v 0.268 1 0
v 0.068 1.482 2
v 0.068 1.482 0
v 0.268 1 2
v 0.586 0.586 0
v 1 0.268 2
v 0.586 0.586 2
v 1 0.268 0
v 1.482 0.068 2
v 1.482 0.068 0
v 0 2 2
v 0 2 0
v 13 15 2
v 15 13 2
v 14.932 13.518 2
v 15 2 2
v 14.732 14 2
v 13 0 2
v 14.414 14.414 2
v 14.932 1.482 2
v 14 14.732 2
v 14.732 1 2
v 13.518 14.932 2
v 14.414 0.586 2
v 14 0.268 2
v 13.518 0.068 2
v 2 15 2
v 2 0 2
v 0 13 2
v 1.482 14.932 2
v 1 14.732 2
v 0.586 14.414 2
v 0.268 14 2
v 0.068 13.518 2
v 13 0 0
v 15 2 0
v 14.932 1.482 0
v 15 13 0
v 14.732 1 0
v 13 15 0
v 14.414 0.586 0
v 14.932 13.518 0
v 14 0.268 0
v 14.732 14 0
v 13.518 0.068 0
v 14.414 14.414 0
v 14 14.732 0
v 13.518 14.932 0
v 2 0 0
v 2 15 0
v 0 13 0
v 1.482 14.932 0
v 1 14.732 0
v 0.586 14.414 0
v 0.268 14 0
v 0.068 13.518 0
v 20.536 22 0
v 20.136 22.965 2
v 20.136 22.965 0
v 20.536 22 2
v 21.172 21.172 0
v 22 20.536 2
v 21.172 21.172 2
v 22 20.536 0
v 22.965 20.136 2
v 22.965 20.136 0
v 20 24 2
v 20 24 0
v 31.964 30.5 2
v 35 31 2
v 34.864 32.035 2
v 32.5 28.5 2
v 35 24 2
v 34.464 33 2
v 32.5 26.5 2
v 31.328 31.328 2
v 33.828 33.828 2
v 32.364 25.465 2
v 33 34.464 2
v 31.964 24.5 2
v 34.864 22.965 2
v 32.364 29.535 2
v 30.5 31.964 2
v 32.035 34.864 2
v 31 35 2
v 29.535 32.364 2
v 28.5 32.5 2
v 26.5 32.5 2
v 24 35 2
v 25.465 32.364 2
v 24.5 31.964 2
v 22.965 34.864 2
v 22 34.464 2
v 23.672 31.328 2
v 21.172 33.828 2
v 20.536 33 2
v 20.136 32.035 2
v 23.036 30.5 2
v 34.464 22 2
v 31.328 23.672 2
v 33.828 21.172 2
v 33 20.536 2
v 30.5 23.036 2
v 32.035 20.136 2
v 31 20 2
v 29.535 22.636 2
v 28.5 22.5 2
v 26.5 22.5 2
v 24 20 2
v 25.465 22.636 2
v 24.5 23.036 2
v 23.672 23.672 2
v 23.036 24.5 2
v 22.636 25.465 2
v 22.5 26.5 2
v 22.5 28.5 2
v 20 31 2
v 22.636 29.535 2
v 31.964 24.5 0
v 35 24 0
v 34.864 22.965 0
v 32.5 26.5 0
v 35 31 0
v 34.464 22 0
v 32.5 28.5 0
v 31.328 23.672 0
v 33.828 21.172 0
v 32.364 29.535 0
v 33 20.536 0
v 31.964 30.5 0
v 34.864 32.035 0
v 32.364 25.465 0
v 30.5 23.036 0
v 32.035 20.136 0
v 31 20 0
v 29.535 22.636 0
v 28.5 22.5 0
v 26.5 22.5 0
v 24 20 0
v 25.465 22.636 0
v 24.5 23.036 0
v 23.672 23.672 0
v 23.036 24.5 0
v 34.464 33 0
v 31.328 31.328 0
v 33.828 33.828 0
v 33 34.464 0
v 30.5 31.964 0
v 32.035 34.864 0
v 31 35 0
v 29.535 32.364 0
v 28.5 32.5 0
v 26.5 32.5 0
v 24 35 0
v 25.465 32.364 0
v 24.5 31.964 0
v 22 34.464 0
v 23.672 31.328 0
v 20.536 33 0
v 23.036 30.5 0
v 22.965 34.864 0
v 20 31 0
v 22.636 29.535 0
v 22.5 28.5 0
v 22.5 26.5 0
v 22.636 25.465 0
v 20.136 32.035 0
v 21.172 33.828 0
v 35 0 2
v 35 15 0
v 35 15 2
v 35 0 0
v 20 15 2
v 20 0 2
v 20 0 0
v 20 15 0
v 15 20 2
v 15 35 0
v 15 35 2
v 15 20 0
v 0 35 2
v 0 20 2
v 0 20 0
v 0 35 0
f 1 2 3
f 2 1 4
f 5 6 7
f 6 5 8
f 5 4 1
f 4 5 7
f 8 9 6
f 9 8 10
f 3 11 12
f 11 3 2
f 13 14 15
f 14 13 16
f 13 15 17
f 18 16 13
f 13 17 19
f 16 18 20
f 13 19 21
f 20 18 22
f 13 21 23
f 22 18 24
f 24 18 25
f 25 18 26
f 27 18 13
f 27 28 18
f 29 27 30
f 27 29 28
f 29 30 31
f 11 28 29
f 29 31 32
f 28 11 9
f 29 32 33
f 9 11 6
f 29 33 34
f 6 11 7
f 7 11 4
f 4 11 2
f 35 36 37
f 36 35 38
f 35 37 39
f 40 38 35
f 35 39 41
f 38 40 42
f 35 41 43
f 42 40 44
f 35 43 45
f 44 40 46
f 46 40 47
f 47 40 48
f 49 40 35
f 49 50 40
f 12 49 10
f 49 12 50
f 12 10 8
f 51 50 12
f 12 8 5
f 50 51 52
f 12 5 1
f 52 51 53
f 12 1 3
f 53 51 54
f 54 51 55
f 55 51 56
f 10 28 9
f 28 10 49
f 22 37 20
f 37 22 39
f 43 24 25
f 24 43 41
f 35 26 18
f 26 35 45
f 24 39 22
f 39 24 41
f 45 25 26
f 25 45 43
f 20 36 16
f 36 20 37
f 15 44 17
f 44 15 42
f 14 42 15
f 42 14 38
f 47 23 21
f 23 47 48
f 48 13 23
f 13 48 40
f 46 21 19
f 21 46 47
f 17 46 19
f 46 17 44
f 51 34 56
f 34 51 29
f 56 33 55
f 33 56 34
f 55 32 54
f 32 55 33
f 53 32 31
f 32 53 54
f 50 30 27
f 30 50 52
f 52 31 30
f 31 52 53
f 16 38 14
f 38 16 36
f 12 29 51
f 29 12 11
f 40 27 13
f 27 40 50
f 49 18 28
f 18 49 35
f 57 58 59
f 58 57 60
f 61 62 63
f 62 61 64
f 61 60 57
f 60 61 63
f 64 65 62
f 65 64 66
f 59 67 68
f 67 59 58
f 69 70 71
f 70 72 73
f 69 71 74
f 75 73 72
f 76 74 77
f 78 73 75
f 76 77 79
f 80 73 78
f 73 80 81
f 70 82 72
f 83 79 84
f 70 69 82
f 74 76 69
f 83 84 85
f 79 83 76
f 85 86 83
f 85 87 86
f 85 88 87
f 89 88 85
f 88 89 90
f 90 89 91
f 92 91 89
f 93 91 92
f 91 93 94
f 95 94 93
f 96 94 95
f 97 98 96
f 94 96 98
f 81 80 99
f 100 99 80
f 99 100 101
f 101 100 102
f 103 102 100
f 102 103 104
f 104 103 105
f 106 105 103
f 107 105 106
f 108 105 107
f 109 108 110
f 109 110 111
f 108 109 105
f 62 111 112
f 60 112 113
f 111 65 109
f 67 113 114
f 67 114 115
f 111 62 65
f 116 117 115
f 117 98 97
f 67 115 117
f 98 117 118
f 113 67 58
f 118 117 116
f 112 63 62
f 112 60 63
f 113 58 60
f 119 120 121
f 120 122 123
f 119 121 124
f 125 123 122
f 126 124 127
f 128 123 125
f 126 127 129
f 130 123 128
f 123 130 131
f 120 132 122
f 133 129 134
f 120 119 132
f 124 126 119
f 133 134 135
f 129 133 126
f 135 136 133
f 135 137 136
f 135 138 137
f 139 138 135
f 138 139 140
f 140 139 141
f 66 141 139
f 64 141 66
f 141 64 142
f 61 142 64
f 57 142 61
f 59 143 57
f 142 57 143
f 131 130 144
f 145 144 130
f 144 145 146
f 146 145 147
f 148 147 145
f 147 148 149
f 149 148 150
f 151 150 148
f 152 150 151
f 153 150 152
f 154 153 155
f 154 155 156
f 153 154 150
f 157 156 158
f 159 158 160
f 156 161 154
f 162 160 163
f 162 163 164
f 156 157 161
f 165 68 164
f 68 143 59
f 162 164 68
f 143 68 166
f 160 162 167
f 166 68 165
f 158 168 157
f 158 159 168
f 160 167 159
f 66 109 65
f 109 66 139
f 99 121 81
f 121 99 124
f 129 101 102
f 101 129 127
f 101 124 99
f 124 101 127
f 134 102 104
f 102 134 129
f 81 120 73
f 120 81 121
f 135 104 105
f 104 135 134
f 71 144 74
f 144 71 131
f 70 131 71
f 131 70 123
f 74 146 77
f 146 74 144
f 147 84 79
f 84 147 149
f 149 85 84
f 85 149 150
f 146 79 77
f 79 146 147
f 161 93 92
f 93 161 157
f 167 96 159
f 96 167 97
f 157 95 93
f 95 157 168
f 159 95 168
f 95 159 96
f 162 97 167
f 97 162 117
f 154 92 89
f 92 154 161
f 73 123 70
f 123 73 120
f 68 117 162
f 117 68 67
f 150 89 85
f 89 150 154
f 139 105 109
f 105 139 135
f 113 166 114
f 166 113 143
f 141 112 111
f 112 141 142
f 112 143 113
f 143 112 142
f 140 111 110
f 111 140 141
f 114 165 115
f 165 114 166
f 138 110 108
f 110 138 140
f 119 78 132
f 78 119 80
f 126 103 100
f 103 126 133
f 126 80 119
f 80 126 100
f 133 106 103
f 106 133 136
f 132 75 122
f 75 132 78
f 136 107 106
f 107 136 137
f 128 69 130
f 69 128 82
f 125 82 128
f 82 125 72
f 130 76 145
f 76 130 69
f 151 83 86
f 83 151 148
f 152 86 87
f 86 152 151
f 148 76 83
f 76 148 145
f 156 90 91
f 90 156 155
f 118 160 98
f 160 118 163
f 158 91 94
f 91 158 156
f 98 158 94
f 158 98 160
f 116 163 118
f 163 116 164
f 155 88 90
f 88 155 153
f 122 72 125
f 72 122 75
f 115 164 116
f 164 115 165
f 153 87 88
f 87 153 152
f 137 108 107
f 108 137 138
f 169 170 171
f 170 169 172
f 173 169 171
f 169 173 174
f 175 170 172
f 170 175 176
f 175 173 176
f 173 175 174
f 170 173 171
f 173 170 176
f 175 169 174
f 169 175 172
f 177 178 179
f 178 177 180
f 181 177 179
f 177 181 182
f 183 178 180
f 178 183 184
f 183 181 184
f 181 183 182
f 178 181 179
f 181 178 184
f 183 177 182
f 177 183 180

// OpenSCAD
DETAIL=24;

module rounded_cube( width, depth, h, roundover)
{
	width = width-roundover*2;
	depth = depth - roundover*2;

	translate([roundover, roundover,0])
	linear_extrude(height=h, true)
	circle(roundover,$fn=DETAIL);

	translate([roundover, roundover,0])
	translate([width,0,0])
	linear_extrude(height=h, true)
	circle(roundover,$fn=DETAIL);

	translate([roundover, roundover,0])
	translate([width,depth,0])
	linear_extrude(height=h)
	circle(roundover,$fn=DETAIL);

	translate([roundover, roundover,0])
	translate([0,depth,0])
	linear_extrude(height=h)
	circle(roundover,$fn=DETAIL);

	translate([roundover, roundover,0])
	translate([-1*roundover,0,0])
	cube([width+roundover*2,depth,h]);

	translate([roundover, roundover,0])
	translate([0,-1*roundover,0])
	cube([width,depth+roundover*2,h]);
}

rounded_cube(15, 15, 2, 2);

translate([20,0,0])
cube([15, 15, 2]);

translate([0,20,0])
cube([15, 15, 2]);

difference()
{
	translate([20,20,0])
	rounded_cube(15, 15, 2, 4);

	translate([22.5,22.5,0])
	rounded_cube(10, 10, 2, 4);

}
